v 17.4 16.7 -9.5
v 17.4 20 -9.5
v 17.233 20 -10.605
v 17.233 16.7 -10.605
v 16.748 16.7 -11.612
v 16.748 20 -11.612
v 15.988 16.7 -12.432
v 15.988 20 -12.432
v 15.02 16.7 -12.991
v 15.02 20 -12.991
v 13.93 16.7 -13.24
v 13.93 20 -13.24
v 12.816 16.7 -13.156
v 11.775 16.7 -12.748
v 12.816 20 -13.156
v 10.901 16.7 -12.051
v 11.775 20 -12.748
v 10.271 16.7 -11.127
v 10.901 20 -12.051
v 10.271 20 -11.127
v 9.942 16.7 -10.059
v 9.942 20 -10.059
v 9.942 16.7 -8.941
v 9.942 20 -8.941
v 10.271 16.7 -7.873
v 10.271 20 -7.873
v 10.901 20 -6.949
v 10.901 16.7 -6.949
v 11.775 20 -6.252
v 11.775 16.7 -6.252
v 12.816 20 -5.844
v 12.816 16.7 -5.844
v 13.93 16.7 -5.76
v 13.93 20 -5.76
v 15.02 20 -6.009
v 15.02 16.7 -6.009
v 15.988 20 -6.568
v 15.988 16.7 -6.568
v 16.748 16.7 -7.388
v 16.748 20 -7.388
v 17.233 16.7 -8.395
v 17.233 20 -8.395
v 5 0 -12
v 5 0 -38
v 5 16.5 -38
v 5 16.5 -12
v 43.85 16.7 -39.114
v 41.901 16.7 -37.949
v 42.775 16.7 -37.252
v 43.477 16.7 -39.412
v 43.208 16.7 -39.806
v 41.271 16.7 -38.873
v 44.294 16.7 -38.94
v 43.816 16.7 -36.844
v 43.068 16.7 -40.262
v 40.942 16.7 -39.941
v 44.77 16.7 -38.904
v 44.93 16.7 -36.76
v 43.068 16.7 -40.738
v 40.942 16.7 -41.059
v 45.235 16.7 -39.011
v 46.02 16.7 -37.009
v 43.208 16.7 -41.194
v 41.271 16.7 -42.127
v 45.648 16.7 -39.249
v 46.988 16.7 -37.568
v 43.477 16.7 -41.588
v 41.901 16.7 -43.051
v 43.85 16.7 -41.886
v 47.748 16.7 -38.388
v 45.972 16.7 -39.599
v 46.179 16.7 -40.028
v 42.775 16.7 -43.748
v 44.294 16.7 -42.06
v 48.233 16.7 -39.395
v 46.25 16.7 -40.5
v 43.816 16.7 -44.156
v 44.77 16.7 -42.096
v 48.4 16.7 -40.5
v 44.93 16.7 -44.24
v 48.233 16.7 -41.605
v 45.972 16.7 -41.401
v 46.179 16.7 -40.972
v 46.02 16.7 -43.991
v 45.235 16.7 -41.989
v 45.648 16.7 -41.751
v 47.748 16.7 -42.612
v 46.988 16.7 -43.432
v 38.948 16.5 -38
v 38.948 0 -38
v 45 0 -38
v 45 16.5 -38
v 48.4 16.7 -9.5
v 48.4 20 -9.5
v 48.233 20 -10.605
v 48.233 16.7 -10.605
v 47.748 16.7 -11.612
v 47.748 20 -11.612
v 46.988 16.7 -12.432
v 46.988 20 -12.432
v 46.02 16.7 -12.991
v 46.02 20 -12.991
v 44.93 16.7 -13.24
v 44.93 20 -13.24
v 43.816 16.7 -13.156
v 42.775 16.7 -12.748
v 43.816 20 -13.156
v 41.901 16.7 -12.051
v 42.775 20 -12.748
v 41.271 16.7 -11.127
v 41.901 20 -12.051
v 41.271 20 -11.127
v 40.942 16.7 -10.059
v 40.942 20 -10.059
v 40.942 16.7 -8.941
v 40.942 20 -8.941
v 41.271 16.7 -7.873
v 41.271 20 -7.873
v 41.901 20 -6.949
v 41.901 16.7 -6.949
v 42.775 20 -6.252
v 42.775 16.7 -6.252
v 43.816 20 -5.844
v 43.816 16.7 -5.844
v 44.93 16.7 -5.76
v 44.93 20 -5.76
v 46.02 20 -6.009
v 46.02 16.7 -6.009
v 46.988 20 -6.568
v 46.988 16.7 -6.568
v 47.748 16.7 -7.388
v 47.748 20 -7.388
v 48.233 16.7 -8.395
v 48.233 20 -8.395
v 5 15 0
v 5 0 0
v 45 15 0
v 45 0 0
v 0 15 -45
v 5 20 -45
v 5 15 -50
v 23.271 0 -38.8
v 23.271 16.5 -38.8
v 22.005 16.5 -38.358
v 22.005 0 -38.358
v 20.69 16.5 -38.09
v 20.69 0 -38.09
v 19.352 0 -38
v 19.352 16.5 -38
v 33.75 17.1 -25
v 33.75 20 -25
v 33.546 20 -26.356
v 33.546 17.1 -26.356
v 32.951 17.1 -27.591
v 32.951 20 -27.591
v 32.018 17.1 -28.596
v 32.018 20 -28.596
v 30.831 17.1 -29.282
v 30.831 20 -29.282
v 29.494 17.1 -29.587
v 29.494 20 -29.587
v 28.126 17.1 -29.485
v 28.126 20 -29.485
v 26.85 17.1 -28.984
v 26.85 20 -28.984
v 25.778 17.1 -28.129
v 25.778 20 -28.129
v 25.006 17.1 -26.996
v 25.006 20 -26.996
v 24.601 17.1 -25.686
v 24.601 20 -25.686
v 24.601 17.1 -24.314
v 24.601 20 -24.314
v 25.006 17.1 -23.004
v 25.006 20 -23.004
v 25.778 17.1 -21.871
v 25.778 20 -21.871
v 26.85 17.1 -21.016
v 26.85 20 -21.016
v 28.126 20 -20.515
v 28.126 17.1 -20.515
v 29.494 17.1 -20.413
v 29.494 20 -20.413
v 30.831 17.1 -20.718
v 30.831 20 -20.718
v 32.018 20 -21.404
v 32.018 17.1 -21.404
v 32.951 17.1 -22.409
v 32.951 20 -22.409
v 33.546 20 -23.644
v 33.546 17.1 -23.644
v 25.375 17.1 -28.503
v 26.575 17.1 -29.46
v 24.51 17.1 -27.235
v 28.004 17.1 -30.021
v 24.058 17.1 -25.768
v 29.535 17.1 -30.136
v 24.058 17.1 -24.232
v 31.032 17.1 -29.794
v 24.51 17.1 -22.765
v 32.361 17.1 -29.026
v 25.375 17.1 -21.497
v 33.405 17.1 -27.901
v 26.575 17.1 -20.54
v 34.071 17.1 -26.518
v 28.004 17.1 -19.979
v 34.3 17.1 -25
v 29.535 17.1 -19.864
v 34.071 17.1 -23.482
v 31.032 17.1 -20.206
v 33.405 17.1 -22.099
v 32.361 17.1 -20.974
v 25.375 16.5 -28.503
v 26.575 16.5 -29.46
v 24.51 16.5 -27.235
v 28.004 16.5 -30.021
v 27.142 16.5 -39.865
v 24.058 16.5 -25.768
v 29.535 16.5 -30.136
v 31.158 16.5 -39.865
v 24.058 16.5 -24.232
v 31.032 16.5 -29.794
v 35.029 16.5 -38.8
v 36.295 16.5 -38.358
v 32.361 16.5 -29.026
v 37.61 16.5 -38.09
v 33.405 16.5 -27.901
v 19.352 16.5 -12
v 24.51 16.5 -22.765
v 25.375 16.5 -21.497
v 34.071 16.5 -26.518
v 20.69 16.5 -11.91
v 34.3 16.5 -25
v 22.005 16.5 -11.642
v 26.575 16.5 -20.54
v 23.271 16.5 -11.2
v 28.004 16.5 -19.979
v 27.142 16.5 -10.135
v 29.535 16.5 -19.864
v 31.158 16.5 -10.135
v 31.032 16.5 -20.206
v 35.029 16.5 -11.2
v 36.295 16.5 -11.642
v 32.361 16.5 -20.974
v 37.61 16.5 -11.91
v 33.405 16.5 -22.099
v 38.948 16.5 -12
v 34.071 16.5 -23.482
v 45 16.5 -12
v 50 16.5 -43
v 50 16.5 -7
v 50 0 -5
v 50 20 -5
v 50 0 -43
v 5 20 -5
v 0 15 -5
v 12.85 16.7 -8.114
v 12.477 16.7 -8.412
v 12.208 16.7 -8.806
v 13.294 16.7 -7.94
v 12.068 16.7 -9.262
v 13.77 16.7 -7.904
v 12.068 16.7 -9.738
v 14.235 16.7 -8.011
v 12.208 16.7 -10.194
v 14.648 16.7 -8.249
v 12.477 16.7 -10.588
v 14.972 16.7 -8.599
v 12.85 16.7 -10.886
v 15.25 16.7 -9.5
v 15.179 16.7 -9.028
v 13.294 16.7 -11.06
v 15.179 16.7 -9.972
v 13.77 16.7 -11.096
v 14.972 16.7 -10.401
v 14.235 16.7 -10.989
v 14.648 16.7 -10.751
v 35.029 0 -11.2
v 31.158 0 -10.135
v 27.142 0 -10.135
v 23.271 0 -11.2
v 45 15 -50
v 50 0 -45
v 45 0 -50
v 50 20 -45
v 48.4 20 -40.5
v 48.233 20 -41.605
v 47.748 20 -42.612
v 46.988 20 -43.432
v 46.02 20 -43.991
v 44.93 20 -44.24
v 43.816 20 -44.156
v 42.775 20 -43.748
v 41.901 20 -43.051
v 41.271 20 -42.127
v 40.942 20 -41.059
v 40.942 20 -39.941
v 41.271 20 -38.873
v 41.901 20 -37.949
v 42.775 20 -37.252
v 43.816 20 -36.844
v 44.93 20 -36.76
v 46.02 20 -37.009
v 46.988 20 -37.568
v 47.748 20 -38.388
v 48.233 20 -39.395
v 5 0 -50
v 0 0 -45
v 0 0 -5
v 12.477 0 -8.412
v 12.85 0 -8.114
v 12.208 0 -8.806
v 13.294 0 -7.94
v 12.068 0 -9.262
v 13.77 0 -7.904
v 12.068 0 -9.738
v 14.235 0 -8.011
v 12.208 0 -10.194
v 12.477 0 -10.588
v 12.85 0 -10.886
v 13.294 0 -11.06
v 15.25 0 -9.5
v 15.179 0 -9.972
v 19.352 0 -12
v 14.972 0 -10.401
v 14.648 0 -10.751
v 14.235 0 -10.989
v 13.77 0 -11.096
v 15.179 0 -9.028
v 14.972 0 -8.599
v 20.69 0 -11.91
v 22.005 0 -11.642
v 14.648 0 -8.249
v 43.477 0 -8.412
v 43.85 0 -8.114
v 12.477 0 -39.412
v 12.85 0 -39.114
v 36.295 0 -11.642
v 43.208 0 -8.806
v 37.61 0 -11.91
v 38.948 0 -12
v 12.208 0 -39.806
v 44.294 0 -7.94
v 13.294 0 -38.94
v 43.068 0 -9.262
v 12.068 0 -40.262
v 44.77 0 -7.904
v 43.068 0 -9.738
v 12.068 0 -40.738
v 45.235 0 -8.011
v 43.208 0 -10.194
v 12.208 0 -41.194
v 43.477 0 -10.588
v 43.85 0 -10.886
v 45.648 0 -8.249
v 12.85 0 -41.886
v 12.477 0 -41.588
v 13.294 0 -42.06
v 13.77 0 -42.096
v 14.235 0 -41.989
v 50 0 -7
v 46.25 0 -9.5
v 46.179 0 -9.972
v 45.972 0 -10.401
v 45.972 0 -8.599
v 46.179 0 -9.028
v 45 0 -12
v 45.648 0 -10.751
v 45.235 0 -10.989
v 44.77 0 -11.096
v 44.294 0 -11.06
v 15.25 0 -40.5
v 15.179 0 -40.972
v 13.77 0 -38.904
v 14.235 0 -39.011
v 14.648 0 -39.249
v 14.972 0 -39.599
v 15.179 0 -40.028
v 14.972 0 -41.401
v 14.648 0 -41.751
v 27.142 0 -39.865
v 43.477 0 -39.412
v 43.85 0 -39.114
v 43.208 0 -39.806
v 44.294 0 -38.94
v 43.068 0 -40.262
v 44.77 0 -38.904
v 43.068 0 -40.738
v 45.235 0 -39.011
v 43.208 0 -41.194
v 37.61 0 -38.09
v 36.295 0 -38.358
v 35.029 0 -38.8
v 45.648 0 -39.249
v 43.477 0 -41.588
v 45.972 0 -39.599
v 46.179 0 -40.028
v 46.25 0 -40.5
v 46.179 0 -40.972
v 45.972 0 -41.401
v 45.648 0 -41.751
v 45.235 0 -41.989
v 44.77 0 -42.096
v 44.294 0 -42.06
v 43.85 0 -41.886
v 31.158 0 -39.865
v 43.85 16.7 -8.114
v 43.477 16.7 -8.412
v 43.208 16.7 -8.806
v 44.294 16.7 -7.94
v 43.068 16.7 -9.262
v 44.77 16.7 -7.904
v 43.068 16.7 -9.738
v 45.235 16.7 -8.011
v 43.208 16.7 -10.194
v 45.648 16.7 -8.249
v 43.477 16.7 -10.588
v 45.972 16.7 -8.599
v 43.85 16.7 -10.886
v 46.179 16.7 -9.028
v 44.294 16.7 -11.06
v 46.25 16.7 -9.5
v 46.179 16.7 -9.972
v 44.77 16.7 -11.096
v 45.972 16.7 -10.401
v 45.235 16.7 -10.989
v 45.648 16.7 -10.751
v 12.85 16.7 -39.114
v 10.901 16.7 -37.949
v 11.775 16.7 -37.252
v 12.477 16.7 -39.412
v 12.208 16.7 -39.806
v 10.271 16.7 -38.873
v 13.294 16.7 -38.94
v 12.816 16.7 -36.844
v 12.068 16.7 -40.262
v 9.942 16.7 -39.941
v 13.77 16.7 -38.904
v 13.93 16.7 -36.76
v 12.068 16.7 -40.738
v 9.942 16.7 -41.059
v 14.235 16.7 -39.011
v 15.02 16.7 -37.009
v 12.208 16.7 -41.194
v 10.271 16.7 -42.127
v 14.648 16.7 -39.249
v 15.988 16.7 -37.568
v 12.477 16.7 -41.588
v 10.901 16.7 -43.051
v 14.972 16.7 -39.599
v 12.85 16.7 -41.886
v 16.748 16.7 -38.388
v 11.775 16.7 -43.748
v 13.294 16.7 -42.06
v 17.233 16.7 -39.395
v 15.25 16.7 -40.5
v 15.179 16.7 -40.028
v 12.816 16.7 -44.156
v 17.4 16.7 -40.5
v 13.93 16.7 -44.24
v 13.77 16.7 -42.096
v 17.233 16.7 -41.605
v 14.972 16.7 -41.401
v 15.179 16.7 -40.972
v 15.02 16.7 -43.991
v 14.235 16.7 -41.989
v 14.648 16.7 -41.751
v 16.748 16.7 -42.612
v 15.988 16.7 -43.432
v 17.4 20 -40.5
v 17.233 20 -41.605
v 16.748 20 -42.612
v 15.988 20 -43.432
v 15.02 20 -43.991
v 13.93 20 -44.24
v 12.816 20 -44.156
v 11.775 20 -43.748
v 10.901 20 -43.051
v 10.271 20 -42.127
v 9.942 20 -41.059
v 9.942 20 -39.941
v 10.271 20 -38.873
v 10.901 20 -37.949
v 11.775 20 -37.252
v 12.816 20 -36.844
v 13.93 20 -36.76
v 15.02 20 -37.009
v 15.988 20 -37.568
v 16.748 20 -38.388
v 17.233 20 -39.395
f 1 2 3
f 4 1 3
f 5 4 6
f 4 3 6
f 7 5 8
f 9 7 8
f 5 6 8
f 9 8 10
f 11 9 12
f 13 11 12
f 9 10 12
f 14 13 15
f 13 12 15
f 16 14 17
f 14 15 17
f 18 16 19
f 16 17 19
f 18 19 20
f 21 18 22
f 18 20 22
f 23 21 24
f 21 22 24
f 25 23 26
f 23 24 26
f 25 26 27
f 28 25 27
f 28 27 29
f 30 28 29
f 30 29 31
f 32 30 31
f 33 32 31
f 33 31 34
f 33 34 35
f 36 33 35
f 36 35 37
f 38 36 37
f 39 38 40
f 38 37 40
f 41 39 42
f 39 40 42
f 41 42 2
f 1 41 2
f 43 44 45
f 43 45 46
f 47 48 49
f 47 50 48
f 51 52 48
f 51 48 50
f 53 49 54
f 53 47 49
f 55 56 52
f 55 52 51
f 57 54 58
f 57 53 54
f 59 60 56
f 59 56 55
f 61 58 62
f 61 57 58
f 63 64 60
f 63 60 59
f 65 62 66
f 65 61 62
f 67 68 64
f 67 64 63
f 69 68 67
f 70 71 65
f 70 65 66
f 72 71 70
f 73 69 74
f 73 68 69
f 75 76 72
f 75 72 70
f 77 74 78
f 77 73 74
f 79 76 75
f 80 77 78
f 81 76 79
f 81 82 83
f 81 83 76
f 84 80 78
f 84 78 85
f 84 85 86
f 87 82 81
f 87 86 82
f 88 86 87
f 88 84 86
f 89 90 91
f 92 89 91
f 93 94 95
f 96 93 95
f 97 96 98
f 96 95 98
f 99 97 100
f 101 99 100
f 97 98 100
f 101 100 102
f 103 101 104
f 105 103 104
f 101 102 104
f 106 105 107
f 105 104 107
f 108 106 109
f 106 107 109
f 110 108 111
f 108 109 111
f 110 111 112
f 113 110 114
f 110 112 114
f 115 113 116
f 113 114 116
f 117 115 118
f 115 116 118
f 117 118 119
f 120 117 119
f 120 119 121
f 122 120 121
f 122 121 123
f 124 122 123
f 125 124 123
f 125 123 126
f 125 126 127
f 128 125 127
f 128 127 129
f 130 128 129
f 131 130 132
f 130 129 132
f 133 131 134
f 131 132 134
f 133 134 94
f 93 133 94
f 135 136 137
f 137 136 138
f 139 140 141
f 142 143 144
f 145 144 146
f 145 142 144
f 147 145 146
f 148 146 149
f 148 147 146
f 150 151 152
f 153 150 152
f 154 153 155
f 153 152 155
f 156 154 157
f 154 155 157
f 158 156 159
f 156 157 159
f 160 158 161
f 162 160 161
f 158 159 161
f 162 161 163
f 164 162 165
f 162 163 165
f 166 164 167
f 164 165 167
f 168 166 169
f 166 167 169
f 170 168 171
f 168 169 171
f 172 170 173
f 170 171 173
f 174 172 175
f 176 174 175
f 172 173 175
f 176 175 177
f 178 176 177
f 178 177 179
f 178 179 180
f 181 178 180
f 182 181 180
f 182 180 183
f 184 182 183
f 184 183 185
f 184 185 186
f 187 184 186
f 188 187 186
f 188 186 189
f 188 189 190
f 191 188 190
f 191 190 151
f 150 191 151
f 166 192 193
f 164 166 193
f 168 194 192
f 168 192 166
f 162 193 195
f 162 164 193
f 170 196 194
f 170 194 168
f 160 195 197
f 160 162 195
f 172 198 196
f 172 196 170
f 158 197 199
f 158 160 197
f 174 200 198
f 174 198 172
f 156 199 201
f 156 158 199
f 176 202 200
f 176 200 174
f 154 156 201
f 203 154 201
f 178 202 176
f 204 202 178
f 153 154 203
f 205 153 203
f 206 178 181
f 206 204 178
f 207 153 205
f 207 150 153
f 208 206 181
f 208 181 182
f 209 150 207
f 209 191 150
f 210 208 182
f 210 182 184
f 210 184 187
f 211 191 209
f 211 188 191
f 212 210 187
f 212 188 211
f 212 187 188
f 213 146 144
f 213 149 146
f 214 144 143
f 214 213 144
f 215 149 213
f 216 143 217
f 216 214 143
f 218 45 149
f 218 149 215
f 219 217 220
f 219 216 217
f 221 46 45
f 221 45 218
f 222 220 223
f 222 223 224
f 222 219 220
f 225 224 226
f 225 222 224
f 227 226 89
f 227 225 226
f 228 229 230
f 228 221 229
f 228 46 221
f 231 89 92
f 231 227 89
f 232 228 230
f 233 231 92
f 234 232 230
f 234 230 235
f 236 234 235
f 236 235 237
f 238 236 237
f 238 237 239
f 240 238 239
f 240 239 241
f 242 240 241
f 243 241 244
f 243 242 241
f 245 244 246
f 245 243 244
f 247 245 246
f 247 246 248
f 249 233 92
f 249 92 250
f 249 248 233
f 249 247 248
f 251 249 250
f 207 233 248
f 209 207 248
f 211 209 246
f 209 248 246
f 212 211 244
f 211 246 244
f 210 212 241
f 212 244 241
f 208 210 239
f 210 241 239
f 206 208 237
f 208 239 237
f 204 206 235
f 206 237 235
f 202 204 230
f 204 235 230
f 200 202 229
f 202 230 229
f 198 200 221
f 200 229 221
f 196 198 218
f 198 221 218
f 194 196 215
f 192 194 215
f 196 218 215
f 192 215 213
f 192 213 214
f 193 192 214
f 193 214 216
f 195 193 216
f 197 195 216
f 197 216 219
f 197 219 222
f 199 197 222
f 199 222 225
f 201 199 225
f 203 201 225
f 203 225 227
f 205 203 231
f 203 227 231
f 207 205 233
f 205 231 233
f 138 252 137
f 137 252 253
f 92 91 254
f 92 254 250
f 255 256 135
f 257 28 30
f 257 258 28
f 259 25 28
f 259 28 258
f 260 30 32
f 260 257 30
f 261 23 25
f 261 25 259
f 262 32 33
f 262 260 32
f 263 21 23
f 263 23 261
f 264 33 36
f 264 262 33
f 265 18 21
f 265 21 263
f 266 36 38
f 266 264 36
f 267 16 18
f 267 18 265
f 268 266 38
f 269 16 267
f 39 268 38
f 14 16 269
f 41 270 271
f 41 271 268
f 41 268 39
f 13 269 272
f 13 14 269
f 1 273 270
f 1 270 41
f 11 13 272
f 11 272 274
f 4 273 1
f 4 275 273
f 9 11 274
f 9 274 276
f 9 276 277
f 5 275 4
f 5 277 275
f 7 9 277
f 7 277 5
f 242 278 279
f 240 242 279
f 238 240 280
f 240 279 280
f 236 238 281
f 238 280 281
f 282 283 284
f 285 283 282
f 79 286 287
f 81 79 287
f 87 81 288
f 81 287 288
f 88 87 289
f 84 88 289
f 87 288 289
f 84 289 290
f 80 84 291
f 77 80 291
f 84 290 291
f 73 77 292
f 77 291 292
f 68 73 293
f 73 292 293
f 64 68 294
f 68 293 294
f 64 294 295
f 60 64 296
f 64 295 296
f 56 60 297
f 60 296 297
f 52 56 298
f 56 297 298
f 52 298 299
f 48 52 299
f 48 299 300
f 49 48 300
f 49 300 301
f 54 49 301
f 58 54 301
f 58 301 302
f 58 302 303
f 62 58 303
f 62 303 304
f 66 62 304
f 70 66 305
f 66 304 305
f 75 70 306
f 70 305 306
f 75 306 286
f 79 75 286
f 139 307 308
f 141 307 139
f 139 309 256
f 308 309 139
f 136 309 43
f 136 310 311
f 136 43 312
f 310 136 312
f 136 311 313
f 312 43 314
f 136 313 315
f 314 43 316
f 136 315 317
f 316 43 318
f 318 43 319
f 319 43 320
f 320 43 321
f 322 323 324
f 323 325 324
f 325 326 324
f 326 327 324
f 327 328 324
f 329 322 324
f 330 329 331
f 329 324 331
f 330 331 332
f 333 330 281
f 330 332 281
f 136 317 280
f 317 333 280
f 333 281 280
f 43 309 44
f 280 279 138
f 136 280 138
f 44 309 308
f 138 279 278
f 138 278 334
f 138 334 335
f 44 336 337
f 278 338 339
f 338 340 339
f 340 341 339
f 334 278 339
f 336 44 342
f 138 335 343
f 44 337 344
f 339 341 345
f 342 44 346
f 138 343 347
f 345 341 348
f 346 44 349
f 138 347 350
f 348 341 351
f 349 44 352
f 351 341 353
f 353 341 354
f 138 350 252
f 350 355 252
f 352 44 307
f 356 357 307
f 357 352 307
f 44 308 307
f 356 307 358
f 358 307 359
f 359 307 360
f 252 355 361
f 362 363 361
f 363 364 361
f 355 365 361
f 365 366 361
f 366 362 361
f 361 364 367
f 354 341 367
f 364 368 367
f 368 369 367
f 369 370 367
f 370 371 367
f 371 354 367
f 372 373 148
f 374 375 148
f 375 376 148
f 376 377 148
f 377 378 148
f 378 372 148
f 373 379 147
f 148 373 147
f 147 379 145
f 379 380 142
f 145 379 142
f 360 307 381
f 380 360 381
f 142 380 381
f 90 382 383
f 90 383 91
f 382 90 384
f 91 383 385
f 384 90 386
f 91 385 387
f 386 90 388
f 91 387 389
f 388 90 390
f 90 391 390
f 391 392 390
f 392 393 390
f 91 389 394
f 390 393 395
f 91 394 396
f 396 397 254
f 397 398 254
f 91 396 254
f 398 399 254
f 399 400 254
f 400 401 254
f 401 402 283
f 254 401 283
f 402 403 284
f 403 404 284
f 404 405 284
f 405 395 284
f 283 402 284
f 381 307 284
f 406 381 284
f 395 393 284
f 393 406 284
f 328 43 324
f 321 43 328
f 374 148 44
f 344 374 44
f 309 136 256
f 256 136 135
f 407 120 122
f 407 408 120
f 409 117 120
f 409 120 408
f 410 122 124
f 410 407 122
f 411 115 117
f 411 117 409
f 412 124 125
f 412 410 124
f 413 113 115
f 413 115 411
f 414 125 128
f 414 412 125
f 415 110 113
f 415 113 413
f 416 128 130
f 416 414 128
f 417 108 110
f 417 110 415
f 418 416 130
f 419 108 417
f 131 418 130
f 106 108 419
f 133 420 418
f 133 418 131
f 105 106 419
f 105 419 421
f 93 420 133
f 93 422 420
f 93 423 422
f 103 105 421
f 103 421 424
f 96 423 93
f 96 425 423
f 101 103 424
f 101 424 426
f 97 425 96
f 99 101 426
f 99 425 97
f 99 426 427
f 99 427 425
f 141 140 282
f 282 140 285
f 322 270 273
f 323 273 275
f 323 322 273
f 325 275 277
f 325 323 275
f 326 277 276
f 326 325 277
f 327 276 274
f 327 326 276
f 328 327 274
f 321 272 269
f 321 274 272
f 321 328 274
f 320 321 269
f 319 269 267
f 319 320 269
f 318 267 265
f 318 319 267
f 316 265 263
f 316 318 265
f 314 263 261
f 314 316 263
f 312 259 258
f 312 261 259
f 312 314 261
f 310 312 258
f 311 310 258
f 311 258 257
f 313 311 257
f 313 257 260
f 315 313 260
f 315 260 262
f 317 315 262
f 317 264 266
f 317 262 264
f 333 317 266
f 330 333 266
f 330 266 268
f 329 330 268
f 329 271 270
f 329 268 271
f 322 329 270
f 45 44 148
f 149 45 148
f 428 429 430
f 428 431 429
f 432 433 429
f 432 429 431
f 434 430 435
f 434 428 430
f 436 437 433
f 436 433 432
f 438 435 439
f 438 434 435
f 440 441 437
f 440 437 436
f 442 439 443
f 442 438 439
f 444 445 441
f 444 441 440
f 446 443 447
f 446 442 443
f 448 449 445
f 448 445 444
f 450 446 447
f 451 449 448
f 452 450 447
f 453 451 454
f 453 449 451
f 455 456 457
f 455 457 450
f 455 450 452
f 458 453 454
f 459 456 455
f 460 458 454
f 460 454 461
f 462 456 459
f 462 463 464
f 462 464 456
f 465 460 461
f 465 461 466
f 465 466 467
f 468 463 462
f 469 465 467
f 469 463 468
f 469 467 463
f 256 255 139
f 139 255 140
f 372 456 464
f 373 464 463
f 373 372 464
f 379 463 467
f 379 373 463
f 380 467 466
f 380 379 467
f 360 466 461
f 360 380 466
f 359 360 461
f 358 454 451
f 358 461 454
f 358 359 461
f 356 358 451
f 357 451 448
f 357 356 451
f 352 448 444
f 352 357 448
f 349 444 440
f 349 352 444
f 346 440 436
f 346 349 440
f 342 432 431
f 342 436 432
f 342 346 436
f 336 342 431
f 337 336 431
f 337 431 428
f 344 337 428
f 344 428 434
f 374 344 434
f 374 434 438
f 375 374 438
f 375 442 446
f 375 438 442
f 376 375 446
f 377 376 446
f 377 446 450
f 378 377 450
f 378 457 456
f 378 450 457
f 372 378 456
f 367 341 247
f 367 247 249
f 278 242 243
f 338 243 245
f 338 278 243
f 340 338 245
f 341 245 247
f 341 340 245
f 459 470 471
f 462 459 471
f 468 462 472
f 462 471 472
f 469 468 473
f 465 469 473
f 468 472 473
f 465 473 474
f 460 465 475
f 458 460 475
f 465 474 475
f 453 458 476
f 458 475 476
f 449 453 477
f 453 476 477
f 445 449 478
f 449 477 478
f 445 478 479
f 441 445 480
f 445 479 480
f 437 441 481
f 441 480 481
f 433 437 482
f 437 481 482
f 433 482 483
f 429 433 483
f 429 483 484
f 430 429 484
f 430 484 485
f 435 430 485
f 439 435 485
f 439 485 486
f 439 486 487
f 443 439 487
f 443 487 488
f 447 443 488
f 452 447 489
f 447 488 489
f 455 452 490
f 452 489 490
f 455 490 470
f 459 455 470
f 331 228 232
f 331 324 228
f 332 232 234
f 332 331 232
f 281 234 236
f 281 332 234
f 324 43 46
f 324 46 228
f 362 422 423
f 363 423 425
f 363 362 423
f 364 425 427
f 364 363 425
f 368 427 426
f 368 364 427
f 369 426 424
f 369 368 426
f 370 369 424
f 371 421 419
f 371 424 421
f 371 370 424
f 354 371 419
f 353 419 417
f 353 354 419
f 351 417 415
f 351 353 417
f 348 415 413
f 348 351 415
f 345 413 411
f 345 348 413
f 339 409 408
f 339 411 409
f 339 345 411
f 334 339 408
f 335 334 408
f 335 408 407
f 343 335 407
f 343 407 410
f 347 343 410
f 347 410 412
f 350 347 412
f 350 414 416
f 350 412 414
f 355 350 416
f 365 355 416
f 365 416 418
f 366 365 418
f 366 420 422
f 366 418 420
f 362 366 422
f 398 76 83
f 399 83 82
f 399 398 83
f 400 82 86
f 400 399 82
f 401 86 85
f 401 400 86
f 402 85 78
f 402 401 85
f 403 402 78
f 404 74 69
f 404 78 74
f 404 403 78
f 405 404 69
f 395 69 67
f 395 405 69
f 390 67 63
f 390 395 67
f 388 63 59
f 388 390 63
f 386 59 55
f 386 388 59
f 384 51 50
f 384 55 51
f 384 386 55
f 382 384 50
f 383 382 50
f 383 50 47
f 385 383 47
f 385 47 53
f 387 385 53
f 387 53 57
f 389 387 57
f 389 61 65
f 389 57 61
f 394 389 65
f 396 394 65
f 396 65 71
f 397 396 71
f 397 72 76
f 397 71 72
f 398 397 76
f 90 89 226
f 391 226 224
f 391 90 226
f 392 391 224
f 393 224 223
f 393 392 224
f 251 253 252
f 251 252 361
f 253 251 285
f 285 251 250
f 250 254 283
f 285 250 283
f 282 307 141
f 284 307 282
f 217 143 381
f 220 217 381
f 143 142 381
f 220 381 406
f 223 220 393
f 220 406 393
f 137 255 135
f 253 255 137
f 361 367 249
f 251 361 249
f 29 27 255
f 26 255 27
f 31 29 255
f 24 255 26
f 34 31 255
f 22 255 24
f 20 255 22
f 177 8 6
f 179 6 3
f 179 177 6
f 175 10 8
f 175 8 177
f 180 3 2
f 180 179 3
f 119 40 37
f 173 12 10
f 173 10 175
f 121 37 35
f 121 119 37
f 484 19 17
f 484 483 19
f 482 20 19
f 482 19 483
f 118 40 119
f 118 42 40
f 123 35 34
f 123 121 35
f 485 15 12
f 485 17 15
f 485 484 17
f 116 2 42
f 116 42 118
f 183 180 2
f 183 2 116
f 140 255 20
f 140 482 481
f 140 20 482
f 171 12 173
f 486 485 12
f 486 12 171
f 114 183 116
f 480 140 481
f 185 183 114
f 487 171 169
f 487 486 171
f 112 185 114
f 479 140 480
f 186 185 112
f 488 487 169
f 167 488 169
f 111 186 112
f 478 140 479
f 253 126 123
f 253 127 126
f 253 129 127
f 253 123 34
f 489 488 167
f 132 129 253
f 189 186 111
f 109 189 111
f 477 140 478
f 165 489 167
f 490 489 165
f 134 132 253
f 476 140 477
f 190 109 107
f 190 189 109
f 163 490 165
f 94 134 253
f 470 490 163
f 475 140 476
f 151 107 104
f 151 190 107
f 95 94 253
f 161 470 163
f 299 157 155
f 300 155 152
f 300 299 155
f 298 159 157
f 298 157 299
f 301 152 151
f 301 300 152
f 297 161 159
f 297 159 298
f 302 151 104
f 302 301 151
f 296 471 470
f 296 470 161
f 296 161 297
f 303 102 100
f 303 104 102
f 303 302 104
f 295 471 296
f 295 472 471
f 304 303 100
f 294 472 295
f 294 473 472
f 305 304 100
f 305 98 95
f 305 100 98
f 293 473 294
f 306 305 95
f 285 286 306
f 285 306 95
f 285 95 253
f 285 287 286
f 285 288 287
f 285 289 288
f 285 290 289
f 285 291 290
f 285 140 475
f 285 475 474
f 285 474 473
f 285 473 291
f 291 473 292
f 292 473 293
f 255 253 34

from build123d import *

# Parameters (mm, degrees)
SKETCH_1_W          = 50
SKETCH_1_H          = 50
SKETCH_1_R          = 1.6
EXTRUDE_1_DEPTH     = 20
SKETCH_2_W          = 45
SKETCH_2_H          = 26
CUT_EXTRUDE_1_DEPTH = 16.5
SKETCH_4_R          = 4.6
CUT_EXTRUDE_2_DEPTH = 15
SKETCH_5_R          = 5.15
CUT_EXTRUDE_3_DEPTH = 0.6
CHAMFER_1_SIZE      = 5
SKETCH_6_R          = 3.75
CUT_EXTRUDE_4_DEPTH = 3.3
SKETCH_7_R          = 15
CUT_EXTRUDE_5_DEPTH = 16.5
FILLET_1_R          = 10


with BuildPart() as part:
    # 草图1 → 凸台-拉伸1 (new body)
    with BuildSketch(Plane(origin=(0, 0, 0), x_dir=(1, 0, 0), z_dir=(0, 1, 0))):
        with Locations((25, 25)):
            Rectangle(SKETCH_1_W, SKETCH_1_H)
        with Locations((13.65, 40.5)):
            Circle(SKETCH_1_R, mode=Mode.SUBTRACT)
        with Locations((44.65, 40.5)):
            Circle(SKETCH_1_R, mode=Mode.SUBTRACT)
        with Locations((44.65, 9.5)):
            Circle(SKETCH_1_R, mode=Mode.SUBTRACT)
        with Locations((13.65, 9.5)):
            Circle(SKETCH_1_R, mode=Mode.SUBTRACT)
    extrude(amount=EXTRUDE_1_DEPTH)

    # 草图2 → 切除-拉伸1 (cut)
    with BuildSketch(Plane.XZ):
        with Locations((27.5, -25)):
            Rectangle(SKETCH_2_W, SKETCH_2_H)
    extrude(amount=-CUT_EXTRUDE_1_DEPTH, mode=Mode.SUBTRACT)

    # 草图4 → 切除-拉伸2 (cut)
    with BuildSketch(Plane(origin=(0, 20, 0), x_dir=(1, 0, 0), z_dir=(0, 1, 0))):
        with Locations((29.15, 25)):
            Circle(SKETCH_4_R)
    extrude(amount=-CUT_EXTRUDE_2_DEPTH, mode=Mode.SUBTRACT)

    # 草图5 → 切除-拉伸3 (cut)
    with BuildSketch(Plane.XZ.offset(-16.5)):
        with Locations((29.15, -25)):
            Circle(SKETCH_5_R)
    extrude(amount=-CUT_EXTRUDE_3_DEPTH, mode=Mode.SUBTRACT)

    # 倒角1
    chamfer_1_edges = [part.edges().sort_by_distance(p)[0] for p in [
        (25, 20, -50),
        (50, 8.25, -12),
        (50, 8.25, -38),
        (0, 20, -25),
        (0, 10, -50),
        (50, 10, -50),
        (50, 10, 0),
        (0, 10, 0),
        (25, 20, 0),
    ]]
    chamfer(chamfer_1_edges, length=CHAMFER_1_SIZE)

    # 草图6 → 切除-拉伸4 (cut)
    with BuildSketch(Plane(origin=(0, 20, 0), x_dir=(1, 0, 0), z_dir=(0, 1, 0))):
        with Locations((13.65, 40.5)):
            Circle(SKETCH_6_R)
        with Locations((44.65, 40.5)):
            Circle(SKETCH_6_R)
        with Locations((44.65, 9.5)):
            Circle(SKETCH_6_R)
        with Locations((13.65, 9.5)):
            Circle(SKETCH_6_R)
    extrude(amount=-CUT_EXTRUDE_4_DEPTH, mode=Mode.SUBTRACT)

    # 草图7 → 切除-拉伸5 (cut)
    with BuildSketch(Plane.XZ):
        with Locations((29.15, -25)):
            Circle(SKETCH_7_R)
    extrude(amount=-CUT_EXTRUDE_5_DEPTH, mode=Mode.SUBTRACT)

    # 圆角1
    fillet_1_edges = [part.edges().sort_by_distance(p)[0] for p in [
        (21.666685226, 8.25, -12),
        (36.633314774, 8.25, -12),
        (36.633314774, 8.25, -38),
        (21.666685226, 8.25, -38),
    ]]
    fillet(fillet_1_edges, radius=FILLET_1_R)


solid = part.part
